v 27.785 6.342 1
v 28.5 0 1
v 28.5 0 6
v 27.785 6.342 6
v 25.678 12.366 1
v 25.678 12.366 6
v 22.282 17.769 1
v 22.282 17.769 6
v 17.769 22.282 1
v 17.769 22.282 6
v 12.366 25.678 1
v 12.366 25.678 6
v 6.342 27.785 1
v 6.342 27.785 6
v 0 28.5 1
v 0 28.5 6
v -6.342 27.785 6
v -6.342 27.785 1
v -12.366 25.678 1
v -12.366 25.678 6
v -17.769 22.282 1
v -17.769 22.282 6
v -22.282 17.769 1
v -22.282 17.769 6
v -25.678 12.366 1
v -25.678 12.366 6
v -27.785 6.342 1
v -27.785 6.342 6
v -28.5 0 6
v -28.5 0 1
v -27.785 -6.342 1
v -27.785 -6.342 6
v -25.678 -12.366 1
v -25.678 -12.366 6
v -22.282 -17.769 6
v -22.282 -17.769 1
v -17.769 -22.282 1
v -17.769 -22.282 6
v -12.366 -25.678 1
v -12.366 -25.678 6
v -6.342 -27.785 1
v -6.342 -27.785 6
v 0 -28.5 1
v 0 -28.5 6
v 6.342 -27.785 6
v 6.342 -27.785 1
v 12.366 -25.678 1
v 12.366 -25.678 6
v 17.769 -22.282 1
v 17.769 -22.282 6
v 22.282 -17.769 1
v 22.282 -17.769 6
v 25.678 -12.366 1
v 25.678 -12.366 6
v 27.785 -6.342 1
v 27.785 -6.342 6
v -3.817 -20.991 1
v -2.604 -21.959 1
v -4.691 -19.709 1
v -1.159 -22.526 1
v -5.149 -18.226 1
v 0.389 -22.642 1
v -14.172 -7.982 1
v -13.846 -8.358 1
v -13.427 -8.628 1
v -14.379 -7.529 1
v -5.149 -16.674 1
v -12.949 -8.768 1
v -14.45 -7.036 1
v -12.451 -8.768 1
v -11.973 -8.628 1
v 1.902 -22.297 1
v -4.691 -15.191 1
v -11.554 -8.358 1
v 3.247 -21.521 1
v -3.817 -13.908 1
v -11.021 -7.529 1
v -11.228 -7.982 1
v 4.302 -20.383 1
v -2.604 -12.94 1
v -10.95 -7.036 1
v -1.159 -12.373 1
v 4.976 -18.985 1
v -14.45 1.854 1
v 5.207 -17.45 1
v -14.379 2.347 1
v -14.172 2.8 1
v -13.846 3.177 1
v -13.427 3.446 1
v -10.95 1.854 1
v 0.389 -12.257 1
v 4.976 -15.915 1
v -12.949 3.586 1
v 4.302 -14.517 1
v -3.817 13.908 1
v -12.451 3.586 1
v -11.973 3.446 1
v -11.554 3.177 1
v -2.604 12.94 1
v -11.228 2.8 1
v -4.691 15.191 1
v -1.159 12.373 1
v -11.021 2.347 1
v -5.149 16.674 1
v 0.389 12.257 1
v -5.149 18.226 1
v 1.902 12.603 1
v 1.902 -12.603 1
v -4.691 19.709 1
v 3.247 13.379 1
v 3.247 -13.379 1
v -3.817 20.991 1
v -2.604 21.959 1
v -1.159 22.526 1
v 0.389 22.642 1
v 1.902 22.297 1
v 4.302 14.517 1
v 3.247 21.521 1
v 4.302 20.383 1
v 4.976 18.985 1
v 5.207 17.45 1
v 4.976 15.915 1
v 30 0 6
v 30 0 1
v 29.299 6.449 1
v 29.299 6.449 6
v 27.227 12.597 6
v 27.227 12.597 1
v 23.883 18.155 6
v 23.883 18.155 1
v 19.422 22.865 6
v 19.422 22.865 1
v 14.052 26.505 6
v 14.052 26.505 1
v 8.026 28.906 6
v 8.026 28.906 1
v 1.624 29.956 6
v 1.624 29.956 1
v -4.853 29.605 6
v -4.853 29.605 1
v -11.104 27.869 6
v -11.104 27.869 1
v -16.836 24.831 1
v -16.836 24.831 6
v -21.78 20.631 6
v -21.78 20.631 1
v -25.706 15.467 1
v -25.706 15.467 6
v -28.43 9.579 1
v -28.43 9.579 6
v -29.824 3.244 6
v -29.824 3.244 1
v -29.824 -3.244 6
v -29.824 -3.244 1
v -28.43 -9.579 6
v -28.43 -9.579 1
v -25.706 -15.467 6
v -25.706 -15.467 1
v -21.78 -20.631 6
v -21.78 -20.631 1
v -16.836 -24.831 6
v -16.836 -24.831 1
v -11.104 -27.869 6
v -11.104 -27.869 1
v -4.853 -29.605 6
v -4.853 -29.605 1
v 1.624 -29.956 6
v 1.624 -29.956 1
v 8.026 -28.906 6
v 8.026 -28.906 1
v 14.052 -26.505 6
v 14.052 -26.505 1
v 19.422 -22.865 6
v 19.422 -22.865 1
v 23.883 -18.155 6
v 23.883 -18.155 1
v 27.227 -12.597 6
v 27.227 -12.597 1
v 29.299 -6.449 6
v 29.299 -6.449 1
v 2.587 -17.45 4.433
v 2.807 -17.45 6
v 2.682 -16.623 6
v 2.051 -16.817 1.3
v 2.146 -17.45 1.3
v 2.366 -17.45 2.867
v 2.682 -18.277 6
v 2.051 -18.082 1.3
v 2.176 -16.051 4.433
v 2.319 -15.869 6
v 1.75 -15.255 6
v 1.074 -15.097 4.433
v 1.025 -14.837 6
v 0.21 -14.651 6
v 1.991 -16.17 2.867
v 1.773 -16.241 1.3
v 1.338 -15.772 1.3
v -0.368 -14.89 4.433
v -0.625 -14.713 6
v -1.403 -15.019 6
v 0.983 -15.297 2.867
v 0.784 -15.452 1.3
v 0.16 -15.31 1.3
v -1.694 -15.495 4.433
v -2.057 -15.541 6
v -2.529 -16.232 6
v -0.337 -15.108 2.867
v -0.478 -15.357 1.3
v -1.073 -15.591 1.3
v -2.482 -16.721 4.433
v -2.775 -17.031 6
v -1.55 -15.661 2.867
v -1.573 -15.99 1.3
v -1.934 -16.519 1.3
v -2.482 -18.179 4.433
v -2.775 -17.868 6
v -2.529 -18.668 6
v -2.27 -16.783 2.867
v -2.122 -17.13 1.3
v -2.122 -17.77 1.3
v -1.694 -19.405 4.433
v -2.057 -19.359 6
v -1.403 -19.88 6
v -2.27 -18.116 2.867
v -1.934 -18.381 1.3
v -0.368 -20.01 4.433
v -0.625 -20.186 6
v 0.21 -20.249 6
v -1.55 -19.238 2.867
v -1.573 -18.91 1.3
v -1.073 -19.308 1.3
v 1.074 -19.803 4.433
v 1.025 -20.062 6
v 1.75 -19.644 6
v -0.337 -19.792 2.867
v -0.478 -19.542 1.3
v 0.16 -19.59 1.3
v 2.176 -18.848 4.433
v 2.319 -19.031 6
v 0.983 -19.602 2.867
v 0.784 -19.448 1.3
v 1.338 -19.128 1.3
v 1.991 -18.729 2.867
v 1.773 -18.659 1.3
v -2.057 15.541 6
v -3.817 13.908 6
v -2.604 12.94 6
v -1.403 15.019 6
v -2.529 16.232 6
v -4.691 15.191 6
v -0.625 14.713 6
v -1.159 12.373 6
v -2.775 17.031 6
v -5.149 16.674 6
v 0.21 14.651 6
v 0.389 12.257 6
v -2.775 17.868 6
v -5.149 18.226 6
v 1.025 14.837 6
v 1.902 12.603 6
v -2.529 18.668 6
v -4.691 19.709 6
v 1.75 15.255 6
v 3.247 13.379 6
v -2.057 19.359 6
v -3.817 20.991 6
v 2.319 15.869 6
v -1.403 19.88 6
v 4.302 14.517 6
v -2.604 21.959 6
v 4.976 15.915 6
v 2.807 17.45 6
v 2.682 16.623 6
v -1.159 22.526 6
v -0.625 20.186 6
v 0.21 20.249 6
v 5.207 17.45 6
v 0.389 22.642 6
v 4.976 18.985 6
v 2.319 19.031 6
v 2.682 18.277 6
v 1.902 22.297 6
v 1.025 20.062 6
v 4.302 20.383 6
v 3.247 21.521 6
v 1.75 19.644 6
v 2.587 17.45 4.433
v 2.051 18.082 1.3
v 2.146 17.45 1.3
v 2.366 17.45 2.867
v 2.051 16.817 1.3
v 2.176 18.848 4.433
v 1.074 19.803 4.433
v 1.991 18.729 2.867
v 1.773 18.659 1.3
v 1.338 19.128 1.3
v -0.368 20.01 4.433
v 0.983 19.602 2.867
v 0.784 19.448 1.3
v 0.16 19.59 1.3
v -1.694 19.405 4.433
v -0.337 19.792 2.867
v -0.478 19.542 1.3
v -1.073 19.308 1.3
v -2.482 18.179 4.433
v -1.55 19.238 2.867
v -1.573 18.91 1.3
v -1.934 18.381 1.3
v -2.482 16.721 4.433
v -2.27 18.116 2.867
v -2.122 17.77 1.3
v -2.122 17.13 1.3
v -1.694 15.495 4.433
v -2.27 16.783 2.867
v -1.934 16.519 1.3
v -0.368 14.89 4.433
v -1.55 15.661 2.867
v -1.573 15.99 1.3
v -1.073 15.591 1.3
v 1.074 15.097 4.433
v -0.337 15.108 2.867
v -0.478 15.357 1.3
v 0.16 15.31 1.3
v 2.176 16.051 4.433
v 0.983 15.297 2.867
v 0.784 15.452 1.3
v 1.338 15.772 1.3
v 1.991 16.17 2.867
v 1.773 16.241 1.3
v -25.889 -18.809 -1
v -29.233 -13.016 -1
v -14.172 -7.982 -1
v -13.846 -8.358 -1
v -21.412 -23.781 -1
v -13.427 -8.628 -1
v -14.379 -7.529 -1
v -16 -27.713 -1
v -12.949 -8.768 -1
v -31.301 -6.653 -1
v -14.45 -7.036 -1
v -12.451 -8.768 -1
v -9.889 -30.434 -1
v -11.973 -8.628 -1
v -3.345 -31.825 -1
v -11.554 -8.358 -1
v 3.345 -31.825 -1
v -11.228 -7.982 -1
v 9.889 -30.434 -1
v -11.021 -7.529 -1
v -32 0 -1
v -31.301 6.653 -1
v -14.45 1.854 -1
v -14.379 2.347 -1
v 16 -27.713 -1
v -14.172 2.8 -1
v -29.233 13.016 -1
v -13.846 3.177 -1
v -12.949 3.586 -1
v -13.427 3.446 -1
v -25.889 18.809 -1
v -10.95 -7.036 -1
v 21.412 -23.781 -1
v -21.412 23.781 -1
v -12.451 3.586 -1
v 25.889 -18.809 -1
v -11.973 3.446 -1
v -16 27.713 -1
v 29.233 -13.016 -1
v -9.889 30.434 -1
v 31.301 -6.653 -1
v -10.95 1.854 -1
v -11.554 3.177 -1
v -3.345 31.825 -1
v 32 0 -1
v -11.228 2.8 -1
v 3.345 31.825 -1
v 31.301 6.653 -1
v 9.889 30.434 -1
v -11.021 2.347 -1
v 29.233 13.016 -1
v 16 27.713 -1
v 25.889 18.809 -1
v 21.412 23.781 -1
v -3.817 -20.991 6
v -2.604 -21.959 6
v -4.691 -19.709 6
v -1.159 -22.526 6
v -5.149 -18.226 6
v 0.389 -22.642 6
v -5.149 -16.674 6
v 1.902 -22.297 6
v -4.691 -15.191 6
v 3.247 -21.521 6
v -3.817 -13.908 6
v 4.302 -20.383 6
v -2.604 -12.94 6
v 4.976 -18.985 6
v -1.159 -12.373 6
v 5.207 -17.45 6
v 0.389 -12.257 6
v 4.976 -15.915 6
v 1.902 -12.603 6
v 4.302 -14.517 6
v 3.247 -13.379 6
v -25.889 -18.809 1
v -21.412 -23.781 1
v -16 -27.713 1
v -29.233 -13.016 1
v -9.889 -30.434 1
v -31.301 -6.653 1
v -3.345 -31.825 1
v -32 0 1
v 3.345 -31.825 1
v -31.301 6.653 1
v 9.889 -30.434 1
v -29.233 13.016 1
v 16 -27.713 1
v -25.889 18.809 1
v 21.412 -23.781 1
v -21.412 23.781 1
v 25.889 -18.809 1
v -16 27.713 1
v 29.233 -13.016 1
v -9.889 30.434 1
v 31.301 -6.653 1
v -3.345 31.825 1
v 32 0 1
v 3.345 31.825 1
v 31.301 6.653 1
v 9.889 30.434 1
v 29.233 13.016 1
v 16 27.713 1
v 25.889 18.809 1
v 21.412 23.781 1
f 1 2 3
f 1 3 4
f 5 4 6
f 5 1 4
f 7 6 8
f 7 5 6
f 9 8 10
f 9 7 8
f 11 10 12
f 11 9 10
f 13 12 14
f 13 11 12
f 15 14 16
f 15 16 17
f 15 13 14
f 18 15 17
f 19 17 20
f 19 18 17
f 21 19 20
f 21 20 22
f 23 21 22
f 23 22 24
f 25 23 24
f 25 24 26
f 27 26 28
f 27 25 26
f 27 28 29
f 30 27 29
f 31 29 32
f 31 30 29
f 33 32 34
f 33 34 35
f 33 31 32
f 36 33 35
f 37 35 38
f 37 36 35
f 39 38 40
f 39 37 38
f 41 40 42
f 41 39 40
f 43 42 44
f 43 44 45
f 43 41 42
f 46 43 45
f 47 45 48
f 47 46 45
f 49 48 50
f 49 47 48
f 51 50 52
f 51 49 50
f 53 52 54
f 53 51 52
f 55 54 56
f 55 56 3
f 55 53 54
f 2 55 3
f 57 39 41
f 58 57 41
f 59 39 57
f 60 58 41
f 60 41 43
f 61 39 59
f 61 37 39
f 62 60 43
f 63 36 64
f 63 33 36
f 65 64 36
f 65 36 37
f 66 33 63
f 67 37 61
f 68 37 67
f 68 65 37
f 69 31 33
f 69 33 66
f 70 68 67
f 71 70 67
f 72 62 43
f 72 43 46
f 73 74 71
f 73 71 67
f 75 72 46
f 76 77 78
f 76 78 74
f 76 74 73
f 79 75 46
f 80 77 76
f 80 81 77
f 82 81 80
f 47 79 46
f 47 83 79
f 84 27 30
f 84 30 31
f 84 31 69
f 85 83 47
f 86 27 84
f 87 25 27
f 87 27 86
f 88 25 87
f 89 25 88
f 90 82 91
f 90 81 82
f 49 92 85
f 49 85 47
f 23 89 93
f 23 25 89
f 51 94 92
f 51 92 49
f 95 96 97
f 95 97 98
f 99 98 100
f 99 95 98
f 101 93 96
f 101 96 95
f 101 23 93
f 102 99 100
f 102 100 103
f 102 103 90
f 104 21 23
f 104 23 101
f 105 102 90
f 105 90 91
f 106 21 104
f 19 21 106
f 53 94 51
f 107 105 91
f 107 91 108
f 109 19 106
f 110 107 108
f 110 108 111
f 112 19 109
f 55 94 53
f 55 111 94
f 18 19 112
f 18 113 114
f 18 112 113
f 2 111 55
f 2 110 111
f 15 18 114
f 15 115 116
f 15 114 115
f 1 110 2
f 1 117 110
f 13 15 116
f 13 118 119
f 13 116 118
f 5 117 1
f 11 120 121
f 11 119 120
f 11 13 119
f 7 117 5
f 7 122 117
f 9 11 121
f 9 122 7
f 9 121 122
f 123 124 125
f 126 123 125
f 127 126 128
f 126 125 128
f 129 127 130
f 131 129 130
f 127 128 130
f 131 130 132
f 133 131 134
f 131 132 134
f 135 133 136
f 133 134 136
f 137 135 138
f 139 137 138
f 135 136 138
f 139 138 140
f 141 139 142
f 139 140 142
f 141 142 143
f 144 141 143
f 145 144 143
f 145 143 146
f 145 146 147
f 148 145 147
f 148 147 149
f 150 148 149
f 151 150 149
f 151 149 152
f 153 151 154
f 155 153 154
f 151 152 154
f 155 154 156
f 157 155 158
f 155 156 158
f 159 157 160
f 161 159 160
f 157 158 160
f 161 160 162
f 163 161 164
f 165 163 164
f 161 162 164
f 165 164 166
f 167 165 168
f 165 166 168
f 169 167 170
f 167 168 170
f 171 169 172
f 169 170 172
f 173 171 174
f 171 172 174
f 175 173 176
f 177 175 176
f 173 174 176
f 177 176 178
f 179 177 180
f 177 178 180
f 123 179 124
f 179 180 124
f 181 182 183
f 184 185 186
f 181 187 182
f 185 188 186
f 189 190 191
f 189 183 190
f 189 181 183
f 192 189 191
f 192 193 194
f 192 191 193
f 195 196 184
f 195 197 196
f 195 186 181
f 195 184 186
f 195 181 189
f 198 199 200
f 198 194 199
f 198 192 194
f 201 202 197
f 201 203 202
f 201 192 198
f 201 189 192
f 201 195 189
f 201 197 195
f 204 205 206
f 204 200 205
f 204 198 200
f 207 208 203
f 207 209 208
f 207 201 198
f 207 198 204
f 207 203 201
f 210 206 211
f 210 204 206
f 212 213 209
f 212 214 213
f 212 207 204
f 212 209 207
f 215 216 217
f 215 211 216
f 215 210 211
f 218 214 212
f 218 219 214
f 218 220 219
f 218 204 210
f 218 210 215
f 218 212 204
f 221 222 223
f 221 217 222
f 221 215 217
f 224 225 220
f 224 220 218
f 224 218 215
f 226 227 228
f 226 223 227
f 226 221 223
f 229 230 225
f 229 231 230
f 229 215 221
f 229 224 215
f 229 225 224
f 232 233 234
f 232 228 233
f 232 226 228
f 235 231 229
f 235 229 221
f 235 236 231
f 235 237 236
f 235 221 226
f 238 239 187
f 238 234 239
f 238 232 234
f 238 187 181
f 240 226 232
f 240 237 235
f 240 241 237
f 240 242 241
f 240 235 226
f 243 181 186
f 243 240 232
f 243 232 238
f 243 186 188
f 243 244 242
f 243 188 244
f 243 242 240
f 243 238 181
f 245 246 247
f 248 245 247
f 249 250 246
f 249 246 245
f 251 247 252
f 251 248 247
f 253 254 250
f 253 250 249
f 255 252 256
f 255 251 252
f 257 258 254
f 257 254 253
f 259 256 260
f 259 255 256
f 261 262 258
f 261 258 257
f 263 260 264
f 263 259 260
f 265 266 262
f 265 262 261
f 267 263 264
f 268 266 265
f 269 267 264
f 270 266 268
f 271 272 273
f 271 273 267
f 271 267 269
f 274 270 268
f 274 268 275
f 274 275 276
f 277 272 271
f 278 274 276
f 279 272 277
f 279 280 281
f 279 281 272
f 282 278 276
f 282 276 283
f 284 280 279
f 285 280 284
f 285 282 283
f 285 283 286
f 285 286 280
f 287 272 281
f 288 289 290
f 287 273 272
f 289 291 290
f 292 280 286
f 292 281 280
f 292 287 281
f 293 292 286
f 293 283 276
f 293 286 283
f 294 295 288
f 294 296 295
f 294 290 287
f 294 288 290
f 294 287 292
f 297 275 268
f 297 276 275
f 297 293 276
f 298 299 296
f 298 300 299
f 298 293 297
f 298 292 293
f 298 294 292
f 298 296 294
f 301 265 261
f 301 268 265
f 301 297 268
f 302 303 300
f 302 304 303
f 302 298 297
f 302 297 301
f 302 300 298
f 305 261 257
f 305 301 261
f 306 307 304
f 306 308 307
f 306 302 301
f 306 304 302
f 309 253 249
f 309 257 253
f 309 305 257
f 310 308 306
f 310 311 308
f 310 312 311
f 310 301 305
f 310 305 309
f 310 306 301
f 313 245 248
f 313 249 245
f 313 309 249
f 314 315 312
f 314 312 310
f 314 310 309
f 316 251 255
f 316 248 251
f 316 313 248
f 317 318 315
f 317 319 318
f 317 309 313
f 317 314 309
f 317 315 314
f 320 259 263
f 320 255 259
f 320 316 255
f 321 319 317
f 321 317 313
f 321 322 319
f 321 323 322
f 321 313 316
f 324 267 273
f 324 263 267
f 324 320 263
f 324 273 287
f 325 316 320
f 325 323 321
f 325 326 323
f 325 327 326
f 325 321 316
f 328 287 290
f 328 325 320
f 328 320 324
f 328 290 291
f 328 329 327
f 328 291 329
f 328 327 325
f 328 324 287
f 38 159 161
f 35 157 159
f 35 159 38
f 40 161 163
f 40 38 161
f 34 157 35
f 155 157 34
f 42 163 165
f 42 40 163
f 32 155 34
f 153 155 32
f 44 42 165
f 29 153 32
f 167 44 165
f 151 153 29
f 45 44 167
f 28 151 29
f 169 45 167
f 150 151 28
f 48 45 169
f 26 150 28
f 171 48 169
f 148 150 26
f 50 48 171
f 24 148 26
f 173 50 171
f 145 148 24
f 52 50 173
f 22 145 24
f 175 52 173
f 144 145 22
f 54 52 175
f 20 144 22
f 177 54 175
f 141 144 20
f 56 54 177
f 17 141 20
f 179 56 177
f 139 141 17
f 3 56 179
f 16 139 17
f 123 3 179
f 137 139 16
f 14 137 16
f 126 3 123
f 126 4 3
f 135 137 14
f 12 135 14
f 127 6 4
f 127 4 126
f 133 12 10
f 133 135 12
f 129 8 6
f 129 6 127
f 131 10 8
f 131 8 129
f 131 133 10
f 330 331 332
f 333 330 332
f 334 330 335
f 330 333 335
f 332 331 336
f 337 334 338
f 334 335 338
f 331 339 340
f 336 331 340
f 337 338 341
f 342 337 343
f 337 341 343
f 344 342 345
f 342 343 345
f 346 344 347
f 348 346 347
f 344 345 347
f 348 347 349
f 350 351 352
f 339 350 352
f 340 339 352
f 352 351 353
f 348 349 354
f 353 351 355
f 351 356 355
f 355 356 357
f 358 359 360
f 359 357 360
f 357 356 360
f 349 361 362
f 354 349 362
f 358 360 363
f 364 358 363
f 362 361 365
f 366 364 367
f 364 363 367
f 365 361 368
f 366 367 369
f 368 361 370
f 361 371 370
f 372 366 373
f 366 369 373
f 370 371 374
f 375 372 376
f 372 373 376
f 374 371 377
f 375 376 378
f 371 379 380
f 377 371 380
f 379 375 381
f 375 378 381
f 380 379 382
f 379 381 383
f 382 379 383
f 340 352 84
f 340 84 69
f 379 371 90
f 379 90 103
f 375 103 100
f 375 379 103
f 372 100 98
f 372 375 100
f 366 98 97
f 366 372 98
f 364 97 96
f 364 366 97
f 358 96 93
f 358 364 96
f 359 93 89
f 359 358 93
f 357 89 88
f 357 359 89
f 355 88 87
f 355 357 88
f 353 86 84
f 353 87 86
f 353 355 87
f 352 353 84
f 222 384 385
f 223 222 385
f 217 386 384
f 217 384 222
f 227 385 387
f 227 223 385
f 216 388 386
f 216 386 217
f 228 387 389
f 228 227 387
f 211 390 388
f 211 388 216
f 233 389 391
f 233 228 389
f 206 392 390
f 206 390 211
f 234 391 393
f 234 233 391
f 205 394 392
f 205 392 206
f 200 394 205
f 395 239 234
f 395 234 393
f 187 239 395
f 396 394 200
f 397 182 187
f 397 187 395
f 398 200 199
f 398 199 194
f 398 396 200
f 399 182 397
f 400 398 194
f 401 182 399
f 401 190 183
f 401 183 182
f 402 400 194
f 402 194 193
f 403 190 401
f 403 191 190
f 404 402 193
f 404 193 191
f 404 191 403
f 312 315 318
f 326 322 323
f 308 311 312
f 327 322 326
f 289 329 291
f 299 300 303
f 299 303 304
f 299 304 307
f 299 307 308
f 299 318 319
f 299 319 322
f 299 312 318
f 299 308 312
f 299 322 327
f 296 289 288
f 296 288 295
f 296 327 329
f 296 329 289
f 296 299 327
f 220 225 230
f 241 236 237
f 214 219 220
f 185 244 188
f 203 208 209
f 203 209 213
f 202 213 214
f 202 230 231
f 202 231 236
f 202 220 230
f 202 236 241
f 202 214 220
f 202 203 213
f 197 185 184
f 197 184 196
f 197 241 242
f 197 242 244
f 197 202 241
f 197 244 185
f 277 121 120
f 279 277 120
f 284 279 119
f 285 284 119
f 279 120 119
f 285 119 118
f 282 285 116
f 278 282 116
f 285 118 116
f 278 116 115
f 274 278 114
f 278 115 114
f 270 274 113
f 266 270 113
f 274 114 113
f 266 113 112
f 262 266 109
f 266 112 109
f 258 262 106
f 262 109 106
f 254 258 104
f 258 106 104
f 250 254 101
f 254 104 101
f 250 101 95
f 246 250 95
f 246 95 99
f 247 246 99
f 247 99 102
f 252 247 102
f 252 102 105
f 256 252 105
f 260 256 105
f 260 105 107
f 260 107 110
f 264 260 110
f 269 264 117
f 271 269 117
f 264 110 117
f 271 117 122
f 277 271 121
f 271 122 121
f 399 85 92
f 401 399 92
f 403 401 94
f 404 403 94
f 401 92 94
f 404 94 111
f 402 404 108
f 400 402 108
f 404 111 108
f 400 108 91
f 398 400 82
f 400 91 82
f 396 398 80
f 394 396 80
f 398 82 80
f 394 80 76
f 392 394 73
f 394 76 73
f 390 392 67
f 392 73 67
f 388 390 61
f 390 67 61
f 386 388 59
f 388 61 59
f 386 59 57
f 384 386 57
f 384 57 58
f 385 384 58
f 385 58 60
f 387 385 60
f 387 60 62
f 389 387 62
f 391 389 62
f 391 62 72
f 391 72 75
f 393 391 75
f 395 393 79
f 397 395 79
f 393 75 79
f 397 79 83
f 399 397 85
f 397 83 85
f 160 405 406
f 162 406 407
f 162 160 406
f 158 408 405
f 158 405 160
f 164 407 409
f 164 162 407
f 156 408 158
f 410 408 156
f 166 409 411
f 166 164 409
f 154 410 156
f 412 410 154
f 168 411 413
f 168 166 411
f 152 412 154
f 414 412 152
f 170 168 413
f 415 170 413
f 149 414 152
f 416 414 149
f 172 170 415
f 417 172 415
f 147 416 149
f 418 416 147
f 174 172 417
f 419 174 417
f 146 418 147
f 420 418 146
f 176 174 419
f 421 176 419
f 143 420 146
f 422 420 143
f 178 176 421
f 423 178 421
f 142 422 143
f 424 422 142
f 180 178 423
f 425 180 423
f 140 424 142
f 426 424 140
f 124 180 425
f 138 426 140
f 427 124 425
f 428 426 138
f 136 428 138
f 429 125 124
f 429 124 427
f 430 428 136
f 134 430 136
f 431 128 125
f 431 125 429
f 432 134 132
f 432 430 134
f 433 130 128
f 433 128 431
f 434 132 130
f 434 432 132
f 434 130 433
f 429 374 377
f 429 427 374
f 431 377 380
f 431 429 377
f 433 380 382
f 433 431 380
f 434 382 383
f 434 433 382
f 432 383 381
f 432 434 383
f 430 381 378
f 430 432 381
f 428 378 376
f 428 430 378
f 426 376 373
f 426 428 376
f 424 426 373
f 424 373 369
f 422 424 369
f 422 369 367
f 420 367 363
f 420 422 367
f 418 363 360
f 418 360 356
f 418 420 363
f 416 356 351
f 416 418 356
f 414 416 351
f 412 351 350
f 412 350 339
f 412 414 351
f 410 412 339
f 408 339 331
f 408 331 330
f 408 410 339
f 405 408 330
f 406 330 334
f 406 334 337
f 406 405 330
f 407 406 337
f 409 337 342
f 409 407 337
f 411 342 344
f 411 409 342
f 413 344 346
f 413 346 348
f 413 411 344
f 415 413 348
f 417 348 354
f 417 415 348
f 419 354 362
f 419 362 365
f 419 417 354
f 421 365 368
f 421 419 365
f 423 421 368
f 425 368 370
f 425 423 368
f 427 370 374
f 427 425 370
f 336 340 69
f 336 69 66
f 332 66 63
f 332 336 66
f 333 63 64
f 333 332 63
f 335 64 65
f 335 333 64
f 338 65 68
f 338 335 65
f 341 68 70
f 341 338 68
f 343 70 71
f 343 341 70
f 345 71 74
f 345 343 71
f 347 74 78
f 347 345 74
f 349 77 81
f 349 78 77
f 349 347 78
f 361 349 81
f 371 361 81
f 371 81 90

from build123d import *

# Parameters (mm, degrees)
SKETCH1_R               = 32
BOSS_EXTRUDE1_DEPTH     = 0.999998
SKETCH8_R               = 30
SKETCH8_R_2             = 28.5
BOSS_EXTRUDE4_DEPTH     = 5
SKETCH9_R               = 5.207
BOSS_EXTRUDE5_DEPTH     = 5
CUT_EXTRUDE1_DEPTH      = 1
CUT_EXTRUDE1_DEPTH_BACK = 7.999996
SKETCH10_R              = 2.8067
CUT_EXTRUDE2_DEPTH      = 4.7
CUT_EXTRUDE2_TAPER      = 8


with BuildPart() as part:
    # Sketch1 → Boss-Extrude1 (new body, symmetric)
    with BuildSketch(Plane.XY):
        Circle(SKETCH1_R)
    extrude(amount=BOSS_EXTRUDE1_DEPTH, both=True)

    # Sketch8 → Boss-Extrude4 (add)
    with BuildSketch(Plane.XY.offset(0.999998)):
        Circle(SKETCH8_R)
        Circle(SKETCH8_R_2, mode=Mode.SUBTRACT)
    extrude(amount=BOSS_EXTRUDE4_DEPTH)

    # Sketch9 → Boss-Extrude5 (add)
    with BuildSketch(Plane.XY.offset(0.999998)):
        with Locations((0, 17.4498)):
            Circle(SKETCH9_R)
        with Locations((0, -17.4498)):
            Circle(SKETCH9_R)
    extrude(amount=BOSS_EXTRUDE5_DEPTH)

    # Sketch7 → Cut-Extrude1 (cut, two sides)
    with BuildSketch(Plane(origin=(0, 0, -0.999998), x_dir=(-1, 0, 0), z_dir=(0, 0, -1))) as cut_extrude1_sk:
        with BuildLine():
            Line((14.45, 1.8542), (14.45, -7.0358))
            ThreePointArc((14.45, -7.0358), (12.7, -8.7858), (10.95, -7.0358))
            Line((10.95, -7.0358), (10.95, 1.8542))
            ThreePointArc((10.95, 1.8542), (12.7, 3.6042), (14.45, 1.8542))
        make_face()
    extrude(amount=CUT_EXTRUDE1_DEPTH, mode=Mode.SUBTRACT)
    extrude(cut_extrude1_sk.sketch, amount=-CUT_EXTRUDE1_DEPTH_BACK, mode=Mode.SUBTRACT)

    # Sketch10 → Cut-Extrude2 (cut)
    with BuildSketch(Plane.XY.offset(5.999998)):
        with Locations((0, 17.4498)):
            Circle(SKETCH10_R)
        with Locations((0, -17.4498)):
            Circle(SKETCH10_R)
    extrude(amount=-CUT_EXTRUDE2_DEPTH, taper=CUT_EXTRUDE2_TAPER, mode=Mode.SUBTRACT)


solid = part.part
